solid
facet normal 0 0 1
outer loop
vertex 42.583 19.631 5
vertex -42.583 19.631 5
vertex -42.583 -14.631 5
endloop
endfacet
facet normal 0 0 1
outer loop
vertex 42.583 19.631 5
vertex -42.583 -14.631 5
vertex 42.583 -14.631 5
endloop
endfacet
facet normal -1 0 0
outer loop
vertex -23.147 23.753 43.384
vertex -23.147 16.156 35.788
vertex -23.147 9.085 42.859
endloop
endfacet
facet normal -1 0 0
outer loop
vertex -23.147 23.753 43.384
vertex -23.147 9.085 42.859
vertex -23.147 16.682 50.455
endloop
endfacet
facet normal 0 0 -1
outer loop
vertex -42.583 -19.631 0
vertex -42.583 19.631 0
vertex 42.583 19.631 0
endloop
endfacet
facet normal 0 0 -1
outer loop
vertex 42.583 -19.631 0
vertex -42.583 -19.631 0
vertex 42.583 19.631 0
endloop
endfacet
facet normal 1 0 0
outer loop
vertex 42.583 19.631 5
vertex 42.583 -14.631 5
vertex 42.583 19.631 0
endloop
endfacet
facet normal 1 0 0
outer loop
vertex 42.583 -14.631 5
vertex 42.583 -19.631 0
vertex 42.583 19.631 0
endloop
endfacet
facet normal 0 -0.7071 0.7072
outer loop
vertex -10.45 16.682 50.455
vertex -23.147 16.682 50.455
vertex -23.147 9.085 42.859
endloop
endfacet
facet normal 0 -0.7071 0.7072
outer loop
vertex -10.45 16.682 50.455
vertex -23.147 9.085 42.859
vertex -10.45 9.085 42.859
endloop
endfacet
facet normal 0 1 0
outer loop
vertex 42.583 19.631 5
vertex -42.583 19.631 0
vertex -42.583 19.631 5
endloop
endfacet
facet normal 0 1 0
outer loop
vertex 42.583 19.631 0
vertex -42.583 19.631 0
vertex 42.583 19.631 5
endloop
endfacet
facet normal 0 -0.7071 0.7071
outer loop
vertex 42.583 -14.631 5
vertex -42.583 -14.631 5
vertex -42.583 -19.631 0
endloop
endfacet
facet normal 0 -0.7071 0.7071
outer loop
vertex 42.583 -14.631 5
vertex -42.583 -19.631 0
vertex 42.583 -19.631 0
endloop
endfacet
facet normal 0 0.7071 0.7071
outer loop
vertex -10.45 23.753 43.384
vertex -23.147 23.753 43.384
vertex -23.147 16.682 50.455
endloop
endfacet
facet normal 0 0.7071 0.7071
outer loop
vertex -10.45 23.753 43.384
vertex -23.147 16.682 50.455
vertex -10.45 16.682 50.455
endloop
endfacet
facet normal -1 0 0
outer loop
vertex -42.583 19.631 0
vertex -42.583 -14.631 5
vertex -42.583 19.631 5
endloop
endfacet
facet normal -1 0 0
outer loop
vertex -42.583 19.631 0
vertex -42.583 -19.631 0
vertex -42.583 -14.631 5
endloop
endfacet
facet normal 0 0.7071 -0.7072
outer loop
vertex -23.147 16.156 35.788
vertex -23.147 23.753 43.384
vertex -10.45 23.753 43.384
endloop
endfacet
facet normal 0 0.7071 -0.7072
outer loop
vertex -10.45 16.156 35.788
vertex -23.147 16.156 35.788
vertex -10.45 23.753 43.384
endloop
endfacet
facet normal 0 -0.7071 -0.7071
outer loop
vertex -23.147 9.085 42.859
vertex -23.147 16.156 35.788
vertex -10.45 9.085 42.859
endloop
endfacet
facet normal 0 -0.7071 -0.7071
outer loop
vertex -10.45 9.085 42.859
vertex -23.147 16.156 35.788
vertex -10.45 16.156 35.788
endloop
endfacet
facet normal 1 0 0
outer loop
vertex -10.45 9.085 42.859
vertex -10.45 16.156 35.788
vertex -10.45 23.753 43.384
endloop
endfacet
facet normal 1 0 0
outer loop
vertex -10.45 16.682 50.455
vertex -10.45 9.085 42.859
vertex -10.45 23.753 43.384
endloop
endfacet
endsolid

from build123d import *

# Parameters (mm, degrees)
F0_W     = 85.1660892367
F0_H     = 39.2623580992
F1_DEPTH = 5
F2_SIZE  = 4.99999
F3_W     = 12.6967811957
F3_H     = 10.7434242964
F4_DEPTH = 10


# Not quite as in the source:
# - a fillet or chamfer is up to 0.001 mm smaller than in the source, because OpenCascade refuses the exact size


with BuildPart() as f1:
    # F0 (on Top) → F1 (new body)
    with BuildSketch(Plane.XY):
        Rectangle(F0_W, F0_H)
    extrude(amount=F1_DEPTH)

    # F2 (size 5 in the source; OpenCascade refuses exactly that, so slightly less here)
    f2_edges = [f1.edges().sort_by_distance(p)[0] for p in [
        (0, -19.631179, 5),
    ]]
    chamfer(f2_edges, length=F2_SIZE)


with BuildPart() as f4:
    # F3 (on face) → F4 (new body)
    with BuildSketch(Plane(origin=(0, -9.8155895248, 9.8155895248), x_dir=(1, 0, 0), z_dir=(0, -0.7071067812, 0.7071067812))):
        with Locations((-16.7988198809, 42.101662606)):
            Rectangle(F3_W, F3_H)
    extrude(amount=F4_DEPTH)


solid = Compound([f1.part, f4.part])
